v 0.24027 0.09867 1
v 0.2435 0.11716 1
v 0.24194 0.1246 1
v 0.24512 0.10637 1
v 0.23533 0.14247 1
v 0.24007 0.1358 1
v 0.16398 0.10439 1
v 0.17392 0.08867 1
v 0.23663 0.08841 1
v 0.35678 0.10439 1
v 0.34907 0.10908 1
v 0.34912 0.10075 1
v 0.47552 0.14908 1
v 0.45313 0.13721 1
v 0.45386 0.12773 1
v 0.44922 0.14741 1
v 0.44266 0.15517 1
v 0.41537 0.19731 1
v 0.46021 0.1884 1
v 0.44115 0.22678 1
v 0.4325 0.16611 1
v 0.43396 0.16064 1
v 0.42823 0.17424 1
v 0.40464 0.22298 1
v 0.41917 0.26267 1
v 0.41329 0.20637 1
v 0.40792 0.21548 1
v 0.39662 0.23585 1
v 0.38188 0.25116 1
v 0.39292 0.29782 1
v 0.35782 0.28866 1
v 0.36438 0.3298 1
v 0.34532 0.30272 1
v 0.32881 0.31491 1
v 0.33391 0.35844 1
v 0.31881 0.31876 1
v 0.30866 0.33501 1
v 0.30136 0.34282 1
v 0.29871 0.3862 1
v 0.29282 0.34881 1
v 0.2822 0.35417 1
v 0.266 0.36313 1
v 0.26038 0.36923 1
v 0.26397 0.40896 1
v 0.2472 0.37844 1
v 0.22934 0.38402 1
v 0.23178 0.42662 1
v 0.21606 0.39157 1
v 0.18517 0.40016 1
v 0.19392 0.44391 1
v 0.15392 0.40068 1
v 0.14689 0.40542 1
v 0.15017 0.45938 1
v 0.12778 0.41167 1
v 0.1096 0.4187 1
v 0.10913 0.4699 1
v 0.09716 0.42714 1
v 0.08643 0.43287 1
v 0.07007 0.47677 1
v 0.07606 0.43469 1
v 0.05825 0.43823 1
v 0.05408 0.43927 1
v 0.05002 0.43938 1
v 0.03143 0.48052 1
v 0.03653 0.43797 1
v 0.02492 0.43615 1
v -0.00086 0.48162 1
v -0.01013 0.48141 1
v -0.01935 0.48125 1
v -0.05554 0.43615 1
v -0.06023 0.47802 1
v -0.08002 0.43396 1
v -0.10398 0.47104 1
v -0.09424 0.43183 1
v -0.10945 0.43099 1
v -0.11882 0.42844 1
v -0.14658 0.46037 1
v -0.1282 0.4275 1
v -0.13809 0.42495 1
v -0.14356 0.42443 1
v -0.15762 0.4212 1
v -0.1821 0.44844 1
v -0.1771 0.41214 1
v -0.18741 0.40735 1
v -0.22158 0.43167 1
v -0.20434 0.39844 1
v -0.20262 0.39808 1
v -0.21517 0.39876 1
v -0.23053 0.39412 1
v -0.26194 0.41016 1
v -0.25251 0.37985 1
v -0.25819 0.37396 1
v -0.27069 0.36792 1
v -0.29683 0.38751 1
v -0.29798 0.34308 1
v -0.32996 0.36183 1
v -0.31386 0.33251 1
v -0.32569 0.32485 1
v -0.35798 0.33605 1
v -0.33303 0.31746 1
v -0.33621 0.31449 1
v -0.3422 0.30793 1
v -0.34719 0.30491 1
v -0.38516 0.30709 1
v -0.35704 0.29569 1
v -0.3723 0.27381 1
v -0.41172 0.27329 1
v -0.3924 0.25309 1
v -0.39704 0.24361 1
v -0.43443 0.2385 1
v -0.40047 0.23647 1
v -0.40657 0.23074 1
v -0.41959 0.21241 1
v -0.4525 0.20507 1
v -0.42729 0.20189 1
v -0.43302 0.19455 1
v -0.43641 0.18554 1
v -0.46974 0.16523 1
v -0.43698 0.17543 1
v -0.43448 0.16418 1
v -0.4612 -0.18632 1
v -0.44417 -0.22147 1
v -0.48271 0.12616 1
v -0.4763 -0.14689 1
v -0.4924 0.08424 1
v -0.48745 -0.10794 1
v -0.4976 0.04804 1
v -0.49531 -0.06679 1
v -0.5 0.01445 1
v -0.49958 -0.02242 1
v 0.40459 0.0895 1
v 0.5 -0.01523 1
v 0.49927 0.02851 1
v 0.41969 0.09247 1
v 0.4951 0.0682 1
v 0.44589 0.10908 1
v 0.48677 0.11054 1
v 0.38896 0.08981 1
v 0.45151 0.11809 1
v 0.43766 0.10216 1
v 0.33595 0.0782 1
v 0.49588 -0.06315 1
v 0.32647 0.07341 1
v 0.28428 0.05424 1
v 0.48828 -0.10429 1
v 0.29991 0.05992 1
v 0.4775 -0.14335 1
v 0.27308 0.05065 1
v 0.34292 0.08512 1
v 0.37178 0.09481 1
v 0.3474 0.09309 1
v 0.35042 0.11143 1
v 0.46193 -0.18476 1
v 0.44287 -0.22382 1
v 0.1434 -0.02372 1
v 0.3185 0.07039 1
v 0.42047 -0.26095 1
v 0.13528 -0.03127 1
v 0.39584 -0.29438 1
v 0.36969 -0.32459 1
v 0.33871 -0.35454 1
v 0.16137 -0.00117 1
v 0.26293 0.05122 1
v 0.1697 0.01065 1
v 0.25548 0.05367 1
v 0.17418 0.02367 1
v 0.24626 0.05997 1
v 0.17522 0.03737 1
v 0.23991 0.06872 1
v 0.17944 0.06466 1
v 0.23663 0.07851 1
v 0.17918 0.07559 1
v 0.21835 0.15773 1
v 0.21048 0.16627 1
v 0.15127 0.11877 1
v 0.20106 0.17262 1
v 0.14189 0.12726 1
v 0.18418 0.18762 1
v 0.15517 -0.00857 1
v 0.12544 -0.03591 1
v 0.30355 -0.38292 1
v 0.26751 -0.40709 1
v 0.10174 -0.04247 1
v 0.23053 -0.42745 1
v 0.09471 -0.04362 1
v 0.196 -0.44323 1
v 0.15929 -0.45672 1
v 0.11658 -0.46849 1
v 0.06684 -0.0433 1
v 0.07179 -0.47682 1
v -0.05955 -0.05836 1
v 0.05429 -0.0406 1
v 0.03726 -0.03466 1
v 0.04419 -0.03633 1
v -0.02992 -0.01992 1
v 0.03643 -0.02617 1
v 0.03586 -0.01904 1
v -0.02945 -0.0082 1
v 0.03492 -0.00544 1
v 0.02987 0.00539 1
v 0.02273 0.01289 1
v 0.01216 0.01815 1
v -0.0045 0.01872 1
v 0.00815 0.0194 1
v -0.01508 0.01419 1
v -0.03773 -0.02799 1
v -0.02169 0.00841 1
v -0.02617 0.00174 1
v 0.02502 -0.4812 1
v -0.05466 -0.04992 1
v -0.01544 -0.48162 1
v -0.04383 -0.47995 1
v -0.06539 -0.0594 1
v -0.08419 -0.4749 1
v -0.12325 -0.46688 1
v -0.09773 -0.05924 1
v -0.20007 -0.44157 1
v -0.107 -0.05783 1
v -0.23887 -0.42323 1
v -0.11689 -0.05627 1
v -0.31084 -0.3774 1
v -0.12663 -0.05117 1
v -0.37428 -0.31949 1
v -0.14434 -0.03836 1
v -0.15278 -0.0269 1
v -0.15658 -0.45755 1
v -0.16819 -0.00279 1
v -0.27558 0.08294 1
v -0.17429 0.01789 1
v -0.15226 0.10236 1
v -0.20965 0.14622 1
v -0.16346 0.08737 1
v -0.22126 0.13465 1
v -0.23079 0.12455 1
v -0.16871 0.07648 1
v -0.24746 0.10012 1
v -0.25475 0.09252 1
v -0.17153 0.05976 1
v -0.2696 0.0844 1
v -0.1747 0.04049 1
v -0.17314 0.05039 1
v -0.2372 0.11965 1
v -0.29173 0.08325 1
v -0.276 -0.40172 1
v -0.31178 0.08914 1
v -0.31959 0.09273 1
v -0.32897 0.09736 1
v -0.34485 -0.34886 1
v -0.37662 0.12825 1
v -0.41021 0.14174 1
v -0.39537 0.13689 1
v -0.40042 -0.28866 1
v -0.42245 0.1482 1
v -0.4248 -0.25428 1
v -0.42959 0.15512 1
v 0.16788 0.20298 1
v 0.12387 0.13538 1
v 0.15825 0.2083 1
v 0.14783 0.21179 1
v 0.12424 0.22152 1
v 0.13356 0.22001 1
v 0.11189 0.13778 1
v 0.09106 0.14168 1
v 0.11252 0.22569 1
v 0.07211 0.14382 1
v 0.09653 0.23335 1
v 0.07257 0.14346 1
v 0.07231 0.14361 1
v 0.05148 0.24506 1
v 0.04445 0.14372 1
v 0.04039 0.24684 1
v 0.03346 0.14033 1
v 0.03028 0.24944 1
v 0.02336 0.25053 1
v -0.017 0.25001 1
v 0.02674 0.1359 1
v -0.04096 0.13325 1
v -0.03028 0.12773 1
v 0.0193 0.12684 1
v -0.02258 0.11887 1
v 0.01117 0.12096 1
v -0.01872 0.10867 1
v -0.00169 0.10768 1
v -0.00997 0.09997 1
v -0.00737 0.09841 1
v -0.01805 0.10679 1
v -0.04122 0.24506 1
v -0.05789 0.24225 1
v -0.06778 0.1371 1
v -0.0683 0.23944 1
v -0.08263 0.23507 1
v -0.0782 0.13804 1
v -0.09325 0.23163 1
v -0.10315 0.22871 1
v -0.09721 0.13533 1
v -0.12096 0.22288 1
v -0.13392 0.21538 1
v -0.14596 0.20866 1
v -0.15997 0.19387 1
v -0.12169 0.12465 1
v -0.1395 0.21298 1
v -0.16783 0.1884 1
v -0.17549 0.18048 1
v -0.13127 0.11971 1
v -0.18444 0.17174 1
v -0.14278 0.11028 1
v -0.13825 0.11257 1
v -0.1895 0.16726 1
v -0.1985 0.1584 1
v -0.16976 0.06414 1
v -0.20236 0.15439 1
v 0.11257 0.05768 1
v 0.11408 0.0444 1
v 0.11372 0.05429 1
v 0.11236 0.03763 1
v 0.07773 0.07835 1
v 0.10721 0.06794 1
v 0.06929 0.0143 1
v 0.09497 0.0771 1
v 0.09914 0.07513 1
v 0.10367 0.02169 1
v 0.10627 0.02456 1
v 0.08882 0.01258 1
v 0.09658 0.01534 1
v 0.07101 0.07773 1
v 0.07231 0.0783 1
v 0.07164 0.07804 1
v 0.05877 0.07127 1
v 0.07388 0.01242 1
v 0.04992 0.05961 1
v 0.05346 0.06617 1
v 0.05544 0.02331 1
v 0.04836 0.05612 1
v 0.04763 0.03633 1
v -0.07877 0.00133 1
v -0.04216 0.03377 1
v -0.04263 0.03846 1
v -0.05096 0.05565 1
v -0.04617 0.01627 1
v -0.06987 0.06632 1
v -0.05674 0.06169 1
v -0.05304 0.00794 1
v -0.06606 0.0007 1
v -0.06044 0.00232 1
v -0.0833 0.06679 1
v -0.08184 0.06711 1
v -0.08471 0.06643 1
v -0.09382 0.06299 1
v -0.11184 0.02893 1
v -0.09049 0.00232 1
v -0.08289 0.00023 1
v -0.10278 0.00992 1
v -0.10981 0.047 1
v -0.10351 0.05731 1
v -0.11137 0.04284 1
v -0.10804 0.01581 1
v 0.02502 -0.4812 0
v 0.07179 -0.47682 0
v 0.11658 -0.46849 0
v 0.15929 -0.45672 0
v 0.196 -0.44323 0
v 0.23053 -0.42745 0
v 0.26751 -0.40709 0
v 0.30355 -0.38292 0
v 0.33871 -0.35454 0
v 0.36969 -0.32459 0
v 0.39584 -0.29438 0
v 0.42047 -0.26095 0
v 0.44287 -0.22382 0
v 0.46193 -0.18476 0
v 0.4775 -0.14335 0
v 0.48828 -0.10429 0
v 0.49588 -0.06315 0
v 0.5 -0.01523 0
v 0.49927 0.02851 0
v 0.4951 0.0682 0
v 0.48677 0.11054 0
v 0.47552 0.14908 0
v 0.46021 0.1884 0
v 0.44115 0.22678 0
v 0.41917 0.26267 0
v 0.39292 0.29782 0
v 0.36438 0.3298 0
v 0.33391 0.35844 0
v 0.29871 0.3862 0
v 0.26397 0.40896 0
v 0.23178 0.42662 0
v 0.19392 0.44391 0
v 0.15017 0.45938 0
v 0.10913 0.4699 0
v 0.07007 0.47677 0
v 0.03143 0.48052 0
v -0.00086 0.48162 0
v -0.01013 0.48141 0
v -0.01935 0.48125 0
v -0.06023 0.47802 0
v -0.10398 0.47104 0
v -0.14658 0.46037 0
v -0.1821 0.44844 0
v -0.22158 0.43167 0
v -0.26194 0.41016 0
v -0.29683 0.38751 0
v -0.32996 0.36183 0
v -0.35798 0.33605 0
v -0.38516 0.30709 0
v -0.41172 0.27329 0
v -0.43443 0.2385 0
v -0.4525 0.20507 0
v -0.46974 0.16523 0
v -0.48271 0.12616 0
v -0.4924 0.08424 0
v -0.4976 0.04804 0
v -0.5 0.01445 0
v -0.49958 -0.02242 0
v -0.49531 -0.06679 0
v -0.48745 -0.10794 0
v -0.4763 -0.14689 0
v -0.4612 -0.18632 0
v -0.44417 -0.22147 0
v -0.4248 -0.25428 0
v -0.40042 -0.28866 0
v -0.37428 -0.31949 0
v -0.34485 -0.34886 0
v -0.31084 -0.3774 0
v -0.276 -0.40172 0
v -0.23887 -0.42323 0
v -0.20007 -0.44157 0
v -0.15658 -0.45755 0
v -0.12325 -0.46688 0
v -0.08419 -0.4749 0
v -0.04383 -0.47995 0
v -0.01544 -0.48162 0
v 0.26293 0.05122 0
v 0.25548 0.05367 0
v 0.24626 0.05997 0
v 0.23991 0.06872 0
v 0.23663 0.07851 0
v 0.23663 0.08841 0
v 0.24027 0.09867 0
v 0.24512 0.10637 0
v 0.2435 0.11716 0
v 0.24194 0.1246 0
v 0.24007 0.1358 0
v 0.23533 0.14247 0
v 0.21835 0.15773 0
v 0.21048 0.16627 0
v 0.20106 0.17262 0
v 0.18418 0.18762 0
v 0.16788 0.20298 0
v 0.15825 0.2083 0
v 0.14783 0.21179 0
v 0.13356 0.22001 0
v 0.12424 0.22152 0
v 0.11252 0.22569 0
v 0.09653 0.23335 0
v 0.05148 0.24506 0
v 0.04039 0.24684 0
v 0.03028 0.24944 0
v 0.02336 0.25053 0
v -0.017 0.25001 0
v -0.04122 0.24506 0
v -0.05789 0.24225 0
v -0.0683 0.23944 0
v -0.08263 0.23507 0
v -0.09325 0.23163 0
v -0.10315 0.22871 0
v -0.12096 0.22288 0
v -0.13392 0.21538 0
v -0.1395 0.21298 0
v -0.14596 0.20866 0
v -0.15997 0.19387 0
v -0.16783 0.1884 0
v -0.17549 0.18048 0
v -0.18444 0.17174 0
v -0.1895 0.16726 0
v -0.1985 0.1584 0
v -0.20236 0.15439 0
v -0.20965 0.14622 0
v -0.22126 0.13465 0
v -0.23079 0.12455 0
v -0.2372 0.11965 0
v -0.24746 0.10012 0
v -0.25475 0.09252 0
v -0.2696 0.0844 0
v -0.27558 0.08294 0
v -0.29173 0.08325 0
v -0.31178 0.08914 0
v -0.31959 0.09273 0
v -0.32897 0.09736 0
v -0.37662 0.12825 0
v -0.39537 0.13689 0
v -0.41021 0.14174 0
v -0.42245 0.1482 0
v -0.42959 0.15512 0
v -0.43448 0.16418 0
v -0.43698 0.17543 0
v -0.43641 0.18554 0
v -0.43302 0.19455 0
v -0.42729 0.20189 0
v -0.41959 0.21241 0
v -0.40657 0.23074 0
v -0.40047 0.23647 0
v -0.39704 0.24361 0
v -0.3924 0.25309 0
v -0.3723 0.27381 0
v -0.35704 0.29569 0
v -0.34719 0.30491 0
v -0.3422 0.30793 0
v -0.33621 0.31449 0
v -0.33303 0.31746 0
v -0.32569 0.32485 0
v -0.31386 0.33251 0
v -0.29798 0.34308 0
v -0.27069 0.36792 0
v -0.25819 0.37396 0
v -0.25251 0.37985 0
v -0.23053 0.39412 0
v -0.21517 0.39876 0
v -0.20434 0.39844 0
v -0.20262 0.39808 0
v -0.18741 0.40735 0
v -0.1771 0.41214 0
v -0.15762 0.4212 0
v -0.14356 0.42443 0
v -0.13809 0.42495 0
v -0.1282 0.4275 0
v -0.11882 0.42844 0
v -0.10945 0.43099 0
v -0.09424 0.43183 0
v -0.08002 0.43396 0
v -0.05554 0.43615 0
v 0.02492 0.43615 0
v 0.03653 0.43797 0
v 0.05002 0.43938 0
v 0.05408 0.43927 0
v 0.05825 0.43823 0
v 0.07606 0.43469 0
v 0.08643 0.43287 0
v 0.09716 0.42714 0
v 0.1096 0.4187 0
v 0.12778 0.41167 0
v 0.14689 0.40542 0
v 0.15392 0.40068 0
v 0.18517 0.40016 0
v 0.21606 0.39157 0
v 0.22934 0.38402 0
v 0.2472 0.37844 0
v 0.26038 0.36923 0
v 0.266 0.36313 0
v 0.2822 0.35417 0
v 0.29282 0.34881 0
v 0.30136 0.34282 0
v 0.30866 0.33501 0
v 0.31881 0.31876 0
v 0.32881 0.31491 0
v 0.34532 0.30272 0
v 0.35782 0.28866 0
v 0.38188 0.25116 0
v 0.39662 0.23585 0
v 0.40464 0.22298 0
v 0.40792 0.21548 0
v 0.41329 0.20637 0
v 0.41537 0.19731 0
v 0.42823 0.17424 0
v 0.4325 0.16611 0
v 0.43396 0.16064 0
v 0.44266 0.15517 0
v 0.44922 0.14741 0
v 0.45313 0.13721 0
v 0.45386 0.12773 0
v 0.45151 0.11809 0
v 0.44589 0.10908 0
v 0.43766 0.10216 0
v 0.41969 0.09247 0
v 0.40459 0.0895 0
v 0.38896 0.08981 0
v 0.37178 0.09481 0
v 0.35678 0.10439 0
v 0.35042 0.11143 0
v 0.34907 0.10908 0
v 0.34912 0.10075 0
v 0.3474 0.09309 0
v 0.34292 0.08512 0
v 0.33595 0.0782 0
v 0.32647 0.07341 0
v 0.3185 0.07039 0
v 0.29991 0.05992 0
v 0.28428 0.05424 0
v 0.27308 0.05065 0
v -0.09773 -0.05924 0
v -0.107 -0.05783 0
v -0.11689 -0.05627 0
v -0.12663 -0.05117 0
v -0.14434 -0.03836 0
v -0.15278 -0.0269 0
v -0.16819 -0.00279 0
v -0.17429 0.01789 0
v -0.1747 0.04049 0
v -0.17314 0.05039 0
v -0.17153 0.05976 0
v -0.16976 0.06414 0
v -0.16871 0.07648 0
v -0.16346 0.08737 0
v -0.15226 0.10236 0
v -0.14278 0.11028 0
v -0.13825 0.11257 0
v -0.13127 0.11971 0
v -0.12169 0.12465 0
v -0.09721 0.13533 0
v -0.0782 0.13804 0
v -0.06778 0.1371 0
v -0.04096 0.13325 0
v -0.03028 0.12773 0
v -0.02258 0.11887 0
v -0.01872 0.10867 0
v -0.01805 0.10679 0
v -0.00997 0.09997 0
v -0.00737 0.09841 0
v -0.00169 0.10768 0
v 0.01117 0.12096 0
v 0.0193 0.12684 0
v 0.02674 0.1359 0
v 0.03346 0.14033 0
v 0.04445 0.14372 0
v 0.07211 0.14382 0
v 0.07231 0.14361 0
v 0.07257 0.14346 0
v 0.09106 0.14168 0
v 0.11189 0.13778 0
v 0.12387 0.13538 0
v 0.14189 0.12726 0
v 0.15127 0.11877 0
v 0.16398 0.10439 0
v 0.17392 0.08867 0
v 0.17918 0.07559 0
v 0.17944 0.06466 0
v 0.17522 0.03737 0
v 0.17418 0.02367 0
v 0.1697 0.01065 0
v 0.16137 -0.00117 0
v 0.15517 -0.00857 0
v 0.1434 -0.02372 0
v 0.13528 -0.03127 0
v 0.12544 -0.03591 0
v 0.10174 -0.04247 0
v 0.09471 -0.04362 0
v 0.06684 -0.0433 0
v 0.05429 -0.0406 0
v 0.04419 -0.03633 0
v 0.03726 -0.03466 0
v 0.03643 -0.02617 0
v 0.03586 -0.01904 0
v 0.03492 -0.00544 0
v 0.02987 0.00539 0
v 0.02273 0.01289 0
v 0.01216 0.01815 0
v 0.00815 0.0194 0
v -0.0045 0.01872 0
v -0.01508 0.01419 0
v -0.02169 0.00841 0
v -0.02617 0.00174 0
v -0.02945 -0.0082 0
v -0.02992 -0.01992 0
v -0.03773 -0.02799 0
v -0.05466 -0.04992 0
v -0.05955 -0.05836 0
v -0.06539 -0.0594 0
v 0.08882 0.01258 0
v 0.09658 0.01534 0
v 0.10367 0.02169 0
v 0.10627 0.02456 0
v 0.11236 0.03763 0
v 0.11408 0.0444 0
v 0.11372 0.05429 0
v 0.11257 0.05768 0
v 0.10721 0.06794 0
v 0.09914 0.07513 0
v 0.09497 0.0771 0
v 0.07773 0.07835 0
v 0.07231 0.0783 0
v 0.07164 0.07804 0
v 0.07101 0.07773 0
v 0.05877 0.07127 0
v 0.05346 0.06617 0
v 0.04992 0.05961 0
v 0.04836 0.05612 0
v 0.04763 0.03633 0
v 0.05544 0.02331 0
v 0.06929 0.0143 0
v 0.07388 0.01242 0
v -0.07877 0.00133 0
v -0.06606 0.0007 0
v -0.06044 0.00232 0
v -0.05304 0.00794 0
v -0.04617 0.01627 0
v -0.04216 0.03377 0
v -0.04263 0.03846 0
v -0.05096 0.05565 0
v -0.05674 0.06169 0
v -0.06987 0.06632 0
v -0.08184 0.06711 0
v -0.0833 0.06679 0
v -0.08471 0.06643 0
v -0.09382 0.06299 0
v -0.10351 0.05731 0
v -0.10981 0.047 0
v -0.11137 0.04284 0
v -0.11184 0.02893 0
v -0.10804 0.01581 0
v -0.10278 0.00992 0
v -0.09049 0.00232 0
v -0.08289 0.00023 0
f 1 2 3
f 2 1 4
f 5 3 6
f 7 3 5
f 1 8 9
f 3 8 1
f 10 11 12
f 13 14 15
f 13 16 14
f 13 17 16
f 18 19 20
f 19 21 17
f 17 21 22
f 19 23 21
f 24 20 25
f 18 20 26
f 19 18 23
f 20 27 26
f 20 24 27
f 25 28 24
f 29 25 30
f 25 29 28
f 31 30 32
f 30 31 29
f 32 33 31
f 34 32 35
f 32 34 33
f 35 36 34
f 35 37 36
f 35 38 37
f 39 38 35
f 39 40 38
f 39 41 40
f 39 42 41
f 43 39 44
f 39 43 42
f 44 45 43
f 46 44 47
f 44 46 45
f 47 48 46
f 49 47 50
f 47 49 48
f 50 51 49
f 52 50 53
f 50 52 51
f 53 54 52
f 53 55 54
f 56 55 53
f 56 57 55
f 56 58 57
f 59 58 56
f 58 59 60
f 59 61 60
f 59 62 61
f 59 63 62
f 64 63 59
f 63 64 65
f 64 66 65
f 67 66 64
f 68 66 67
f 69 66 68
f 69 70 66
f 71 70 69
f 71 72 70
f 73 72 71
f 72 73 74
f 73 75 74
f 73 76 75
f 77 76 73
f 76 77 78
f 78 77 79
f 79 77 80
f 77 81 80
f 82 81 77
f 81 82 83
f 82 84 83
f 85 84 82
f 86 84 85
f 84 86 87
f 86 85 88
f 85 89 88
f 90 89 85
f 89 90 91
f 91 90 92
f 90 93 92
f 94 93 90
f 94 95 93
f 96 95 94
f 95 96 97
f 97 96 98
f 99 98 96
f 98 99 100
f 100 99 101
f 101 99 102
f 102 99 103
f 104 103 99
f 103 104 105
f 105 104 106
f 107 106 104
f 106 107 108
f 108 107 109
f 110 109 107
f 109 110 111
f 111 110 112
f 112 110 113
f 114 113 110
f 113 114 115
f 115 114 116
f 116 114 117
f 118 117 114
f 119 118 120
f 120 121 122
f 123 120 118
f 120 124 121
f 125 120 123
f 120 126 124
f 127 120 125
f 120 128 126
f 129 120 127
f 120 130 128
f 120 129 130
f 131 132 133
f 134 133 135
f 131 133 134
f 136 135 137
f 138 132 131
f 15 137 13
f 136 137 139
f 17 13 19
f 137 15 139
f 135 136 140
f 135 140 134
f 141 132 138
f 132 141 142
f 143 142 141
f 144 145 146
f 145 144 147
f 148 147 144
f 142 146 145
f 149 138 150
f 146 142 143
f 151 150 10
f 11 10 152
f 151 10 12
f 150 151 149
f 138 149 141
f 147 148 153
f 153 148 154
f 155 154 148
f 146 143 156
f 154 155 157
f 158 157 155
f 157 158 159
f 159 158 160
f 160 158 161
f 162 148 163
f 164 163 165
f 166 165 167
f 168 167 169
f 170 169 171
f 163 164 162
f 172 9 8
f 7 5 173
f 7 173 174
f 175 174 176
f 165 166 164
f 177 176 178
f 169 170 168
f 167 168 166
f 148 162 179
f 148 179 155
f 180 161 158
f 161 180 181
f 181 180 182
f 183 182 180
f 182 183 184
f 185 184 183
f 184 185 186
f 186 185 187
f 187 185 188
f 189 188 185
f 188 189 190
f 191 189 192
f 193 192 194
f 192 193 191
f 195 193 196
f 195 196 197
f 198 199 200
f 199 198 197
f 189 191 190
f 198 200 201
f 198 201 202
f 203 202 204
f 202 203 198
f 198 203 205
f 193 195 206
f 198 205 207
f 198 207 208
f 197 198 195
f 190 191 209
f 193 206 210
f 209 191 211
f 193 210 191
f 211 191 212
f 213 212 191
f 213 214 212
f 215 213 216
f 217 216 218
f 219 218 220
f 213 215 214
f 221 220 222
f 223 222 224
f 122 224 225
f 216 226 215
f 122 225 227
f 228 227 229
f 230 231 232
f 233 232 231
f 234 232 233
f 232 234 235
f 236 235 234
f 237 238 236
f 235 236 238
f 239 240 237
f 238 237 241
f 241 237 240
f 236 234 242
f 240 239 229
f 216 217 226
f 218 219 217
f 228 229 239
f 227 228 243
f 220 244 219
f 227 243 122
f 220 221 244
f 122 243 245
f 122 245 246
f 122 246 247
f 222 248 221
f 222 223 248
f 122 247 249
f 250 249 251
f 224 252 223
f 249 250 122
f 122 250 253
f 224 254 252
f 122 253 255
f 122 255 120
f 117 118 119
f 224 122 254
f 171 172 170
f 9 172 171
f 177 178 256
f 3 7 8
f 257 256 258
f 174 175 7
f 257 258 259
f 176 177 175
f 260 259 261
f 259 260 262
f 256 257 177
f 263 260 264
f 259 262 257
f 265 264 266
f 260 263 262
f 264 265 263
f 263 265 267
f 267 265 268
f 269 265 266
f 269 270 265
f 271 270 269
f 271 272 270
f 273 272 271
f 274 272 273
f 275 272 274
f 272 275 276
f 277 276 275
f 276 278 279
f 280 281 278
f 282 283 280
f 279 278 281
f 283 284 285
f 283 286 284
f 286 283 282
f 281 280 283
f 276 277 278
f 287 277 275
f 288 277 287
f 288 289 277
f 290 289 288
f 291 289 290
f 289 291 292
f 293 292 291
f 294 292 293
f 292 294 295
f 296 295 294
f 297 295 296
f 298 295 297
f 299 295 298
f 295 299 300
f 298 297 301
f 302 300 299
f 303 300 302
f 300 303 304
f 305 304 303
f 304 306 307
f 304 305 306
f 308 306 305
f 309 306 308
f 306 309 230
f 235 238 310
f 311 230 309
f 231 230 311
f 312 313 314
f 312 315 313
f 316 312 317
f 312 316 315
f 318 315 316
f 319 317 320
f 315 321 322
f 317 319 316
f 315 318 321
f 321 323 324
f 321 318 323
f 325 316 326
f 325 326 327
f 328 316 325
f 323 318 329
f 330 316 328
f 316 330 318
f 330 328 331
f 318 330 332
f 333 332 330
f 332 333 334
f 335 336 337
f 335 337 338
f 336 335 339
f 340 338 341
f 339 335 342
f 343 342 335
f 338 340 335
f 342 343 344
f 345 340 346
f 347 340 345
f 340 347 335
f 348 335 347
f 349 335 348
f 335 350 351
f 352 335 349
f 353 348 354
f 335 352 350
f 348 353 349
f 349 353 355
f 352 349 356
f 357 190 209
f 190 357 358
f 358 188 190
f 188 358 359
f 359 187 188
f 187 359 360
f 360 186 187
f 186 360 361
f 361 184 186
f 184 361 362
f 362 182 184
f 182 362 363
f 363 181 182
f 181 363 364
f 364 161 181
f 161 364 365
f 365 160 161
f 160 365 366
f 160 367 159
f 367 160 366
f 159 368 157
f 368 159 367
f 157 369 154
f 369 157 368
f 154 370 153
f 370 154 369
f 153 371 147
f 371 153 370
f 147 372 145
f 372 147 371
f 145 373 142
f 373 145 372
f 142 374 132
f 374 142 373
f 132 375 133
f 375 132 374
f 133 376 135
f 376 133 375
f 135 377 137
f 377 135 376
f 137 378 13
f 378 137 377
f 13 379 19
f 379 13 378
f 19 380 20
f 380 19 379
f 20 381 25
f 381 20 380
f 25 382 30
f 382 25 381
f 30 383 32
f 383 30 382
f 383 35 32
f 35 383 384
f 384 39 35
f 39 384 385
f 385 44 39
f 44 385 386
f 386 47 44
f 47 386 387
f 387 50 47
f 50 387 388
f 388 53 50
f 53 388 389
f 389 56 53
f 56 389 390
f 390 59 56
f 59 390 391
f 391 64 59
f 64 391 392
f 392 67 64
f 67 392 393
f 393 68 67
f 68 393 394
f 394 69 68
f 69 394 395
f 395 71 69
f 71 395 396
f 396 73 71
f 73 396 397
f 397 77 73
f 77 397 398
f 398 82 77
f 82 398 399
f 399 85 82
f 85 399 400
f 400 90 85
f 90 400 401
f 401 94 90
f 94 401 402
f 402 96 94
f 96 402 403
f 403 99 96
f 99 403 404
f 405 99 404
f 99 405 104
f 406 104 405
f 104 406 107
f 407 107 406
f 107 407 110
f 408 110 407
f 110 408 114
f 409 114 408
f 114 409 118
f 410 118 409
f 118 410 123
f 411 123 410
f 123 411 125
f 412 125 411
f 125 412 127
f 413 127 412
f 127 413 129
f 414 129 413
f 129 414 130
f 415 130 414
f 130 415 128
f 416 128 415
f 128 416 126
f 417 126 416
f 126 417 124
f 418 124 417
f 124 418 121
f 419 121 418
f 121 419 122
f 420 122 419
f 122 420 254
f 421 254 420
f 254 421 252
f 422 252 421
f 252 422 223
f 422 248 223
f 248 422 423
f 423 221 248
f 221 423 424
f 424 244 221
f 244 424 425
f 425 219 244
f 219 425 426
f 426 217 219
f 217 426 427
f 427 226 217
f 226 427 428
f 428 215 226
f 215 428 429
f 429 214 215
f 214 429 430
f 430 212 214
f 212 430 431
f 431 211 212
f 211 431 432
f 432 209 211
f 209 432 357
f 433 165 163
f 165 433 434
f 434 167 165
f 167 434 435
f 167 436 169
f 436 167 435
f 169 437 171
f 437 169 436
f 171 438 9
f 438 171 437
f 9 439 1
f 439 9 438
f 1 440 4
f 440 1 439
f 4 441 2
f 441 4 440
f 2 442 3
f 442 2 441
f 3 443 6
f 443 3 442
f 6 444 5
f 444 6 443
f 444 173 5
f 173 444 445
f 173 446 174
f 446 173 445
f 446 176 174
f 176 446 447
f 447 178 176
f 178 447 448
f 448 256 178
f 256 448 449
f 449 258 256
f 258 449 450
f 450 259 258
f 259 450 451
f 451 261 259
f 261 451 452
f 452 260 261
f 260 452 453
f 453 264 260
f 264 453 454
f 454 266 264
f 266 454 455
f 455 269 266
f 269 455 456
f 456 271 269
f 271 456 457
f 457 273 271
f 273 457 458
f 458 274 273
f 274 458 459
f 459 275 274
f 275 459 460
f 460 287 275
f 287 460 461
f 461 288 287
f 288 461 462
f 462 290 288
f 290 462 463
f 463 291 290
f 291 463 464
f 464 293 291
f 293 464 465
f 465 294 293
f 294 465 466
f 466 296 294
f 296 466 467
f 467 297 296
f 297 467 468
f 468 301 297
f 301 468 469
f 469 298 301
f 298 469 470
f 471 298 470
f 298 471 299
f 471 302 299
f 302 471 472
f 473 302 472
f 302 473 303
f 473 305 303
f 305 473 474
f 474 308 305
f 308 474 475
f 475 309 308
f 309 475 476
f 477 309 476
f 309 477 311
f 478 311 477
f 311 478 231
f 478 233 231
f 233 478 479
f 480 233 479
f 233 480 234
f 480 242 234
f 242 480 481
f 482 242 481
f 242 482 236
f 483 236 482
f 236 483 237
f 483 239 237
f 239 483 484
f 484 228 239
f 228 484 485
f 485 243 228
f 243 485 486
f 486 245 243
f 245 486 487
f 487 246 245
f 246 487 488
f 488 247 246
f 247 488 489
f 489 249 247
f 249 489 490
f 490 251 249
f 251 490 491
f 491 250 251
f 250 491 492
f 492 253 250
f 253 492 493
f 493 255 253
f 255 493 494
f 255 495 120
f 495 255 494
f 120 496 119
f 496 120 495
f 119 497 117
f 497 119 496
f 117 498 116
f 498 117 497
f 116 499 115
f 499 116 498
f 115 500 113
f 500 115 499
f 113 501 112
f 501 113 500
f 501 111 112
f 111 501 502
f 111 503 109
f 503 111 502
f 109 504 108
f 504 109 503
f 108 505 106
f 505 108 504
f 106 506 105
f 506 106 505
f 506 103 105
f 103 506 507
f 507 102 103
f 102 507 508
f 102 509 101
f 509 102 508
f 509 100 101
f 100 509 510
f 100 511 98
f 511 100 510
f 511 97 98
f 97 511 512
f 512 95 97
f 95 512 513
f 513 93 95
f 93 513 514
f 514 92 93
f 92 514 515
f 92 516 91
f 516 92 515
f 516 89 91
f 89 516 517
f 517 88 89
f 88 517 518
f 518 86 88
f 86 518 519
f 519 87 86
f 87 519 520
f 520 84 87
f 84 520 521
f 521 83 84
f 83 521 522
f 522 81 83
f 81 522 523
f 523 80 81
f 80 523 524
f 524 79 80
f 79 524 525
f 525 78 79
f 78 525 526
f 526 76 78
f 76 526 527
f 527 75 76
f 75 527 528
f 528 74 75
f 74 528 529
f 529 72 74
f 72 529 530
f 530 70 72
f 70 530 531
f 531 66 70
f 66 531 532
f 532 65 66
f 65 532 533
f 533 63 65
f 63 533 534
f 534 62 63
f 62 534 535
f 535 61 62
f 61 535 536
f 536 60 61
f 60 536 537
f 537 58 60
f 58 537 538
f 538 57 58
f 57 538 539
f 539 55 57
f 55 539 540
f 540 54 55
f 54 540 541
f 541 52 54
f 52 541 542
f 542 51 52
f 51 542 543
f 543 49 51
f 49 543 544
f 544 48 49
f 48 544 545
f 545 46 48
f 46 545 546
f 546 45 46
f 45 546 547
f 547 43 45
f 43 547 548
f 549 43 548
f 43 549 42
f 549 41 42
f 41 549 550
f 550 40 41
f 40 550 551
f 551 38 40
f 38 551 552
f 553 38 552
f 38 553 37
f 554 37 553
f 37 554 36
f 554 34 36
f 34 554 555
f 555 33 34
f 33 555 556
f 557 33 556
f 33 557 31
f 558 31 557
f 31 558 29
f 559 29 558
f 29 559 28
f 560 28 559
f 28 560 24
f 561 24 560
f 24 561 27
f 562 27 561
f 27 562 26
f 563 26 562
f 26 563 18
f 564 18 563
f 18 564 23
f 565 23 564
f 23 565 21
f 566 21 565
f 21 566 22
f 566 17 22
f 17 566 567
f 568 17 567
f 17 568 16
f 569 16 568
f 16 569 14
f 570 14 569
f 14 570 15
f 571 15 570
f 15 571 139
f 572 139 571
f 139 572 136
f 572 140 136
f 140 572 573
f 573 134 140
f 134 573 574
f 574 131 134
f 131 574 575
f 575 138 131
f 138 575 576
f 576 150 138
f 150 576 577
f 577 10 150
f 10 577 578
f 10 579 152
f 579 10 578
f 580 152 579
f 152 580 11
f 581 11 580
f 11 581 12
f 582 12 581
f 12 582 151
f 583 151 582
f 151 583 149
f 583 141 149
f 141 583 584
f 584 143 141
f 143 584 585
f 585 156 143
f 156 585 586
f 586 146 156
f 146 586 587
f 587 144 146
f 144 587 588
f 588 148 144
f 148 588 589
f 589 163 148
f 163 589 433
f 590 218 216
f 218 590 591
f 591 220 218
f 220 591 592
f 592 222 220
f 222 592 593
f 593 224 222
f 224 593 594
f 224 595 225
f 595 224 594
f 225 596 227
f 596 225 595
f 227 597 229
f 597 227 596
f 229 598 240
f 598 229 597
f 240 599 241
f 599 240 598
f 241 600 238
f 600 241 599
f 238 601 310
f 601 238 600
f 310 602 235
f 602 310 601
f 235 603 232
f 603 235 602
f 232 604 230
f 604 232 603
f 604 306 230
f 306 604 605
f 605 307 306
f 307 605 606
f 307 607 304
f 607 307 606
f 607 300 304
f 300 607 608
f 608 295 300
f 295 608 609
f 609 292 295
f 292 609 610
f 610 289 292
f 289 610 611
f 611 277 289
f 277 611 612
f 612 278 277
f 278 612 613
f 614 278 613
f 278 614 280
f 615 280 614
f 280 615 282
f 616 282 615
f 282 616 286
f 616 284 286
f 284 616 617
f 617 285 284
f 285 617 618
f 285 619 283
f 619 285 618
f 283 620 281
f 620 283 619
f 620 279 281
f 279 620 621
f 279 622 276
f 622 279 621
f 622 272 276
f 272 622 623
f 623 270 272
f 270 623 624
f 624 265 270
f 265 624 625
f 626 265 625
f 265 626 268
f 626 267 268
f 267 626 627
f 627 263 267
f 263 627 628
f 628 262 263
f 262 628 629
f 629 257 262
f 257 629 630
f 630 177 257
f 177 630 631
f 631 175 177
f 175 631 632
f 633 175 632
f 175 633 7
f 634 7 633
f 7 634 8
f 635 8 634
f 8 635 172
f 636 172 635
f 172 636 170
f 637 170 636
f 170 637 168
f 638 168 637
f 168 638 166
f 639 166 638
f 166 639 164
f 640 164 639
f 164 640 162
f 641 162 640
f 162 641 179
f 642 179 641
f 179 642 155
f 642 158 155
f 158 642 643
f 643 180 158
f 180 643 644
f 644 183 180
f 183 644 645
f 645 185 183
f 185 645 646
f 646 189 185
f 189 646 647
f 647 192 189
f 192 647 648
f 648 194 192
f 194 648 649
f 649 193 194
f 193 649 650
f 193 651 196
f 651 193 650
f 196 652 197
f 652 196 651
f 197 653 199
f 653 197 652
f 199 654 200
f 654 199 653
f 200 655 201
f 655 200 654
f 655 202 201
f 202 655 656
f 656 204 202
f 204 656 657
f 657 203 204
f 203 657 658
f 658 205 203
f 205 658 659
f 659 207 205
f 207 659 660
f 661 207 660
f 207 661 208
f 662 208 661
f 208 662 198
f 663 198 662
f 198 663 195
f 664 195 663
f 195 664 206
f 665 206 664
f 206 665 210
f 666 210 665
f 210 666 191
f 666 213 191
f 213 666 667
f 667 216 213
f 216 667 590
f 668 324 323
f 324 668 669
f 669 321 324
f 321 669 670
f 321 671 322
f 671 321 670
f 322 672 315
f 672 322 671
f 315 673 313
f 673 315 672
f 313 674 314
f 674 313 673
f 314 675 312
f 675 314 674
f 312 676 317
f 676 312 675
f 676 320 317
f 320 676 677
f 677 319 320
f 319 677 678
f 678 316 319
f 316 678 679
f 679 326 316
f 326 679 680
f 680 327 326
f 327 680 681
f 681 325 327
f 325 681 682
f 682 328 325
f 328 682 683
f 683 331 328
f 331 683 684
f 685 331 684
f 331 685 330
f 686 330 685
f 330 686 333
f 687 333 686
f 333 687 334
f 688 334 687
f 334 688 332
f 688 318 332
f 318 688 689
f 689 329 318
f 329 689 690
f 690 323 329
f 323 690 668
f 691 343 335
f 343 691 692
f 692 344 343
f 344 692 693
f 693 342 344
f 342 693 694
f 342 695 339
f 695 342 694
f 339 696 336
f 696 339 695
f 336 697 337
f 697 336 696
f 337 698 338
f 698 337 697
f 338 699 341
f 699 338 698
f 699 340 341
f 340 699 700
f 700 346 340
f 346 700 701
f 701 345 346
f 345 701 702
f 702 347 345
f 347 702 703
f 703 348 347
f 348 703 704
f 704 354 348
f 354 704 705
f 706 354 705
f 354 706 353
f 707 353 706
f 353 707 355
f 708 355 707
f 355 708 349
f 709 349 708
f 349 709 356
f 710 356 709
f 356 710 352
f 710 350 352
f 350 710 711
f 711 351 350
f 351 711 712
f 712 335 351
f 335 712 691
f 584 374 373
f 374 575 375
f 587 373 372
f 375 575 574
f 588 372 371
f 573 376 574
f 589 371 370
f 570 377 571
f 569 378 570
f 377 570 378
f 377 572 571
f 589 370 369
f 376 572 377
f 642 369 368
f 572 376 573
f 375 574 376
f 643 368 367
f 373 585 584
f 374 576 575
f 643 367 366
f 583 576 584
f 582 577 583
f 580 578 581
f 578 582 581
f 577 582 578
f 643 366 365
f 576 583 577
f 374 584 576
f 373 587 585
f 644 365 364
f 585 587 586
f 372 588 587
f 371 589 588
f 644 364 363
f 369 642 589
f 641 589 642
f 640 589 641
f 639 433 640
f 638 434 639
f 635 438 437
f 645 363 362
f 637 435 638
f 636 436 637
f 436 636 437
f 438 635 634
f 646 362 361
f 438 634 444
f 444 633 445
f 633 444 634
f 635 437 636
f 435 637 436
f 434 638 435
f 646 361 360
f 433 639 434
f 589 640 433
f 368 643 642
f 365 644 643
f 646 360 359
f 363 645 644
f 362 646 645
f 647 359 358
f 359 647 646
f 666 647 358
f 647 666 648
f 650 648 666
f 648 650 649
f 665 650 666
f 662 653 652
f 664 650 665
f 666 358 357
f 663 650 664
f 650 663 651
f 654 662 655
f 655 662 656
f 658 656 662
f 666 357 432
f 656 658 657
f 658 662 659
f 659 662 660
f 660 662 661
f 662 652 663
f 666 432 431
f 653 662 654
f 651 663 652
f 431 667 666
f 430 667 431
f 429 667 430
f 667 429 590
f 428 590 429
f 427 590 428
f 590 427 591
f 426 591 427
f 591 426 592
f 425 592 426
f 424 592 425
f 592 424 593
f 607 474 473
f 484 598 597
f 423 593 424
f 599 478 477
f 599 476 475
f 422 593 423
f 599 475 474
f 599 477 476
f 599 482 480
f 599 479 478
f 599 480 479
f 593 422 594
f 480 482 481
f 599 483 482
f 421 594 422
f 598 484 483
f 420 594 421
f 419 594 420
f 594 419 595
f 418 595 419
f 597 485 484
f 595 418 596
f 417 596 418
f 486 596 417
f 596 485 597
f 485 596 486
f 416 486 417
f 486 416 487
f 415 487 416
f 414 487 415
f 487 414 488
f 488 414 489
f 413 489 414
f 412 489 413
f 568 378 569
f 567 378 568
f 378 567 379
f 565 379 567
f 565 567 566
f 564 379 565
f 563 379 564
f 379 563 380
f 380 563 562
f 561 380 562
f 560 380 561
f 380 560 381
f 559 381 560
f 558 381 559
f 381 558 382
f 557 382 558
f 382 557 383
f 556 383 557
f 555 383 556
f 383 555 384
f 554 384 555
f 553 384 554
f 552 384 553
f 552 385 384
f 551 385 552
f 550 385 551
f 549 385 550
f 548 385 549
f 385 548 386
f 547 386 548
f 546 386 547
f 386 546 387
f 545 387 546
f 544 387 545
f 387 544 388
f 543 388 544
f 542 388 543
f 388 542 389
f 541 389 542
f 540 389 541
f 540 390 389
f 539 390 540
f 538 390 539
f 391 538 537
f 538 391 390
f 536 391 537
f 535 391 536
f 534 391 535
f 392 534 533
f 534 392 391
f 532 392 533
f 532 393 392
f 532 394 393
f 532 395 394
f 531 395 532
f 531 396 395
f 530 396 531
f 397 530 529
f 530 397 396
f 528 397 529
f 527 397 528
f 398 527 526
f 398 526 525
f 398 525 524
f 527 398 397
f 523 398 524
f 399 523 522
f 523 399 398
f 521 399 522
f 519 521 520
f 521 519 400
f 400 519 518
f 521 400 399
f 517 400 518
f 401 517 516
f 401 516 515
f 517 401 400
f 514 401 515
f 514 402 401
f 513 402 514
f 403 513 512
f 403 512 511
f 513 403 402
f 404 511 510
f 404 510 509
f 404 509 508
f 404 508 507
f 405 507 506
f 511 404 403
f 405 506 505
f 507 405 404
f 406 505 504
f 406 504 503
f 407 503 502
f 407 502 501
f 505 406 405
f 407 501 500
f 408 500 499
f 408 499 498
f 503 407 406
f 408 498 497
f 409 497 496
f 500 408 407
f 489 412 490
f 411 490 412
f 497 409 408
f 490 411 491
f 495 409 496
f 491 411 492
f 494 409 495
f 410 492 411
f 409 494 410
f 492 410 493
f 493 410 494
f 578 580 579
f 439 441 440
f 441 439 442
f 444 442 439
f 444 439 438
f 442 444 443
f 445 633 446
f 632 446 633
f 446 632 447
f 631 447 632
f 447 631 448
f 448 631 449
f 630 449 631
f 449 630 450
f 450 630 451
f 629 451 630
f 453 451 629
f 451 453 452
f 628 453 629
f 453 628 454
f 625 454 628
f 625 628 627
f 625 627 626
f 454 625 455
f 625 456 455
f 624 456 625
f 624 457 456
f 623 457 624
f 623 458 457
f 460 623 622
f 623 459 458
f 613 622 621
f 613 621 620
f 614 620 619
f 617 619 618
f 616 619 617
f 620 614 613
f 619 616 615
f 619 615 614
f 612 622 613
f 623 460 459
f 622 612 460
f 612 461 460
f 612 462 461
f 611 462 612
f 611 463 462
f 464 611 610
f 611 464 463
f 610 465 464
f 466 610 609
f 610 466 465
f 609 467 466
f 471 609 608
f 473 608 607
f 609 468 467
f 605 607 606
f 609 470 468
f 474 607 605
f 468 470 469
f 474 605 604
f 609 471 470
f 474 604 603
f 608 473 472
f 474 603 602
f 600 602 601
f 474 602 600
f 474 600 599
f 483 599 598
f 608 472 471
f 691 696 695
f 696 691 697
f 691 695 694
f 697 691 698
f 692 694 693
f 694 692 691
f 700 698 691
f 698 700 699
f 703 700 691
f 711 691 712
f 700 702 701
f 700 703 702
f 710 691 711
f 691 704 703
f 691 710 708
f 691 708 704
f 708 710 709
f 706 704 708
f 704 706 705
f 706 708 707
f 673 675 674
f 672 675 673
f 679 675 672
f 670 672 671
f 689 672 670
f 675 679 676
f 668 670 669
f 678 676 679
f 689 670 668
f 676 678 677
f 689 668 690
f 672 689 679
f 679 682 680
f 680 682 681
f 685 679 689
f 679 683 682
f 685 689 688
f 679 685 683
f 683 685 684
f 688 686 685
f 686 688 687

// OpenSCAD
module Hedwig3black_1()
{
 /* Generated by trace2scad version 20150415
    http://aggregate.org/MAKE/TRACE2SCAD/
    Optimized model has 357/2605 original points
 */
 color([0.5, 0.5, 0.5])
 assign(minx=314) /* polygon minx=314 */
 assign(miny=368) /* polygon miny=368 */
 assign(maxx=19515) /* polygon maxx=19515 */
 assign(maxy=18863) /* polygon maxy=18863 */
 assign(dx=maxx-minx)
 assign(dy=maxy-miny)
 assign(maxd=((dx>dy)?dx:dy))
 scale([1/maxd, 1/maxd, 1])
 translate([-minx-dx/2, -miny-dy/2, 0])
 linear_extrude(height=1, convexity=357)
 union() {
  union() {
   union() {
    difference() {
     polygon([[9720,18859],[9543,18856],[8758,18794],[7918,18660],[7100,18455],[6418,18226],[5660,17904],[4885,17491],[4215,17056],[3579,16563],[3041,16068],[2519,15512],[2009,14863],[1573,14195],[1226,13553],[895,12788],[646,12038],[460,11233],[360,10538],[314,9893],[322,9185],[404,8333],[555,7543],[769,6795],[1059,6038],[1386,5363],[1758,4733],[2226,4073],[2728,3481],[3293,2917],[3946,2369],[4615,1902],[5328,1489],[6073,1137],[6908,830],[7548,651],[8298,497],[9073,400],[9618,368],[10395,376],[11293,460],[12153,620],[12973,846],[13678,1105],[14341,1408],[15051,1799],[15743,2263],[16418,2808],[17013,3383],[17515,3963],[17988,4605],[18418,5318],[18784,6068],[19083,6863],[19290,7613],[19436,8403],[19515,9323],[19501,10163],[19421,10925],[19261,11738],[19045,12478],[18751,13233],[18385,13970],[17963,14659],[17459,15334],[16911,15948],[16326,16498],[15650,17031],[14983,17468],[14365,17807],[13638,18139],[12798,18436],[12010,18638],[11260,18770],[10518,18842],[9898,18863]], convexity=6);
     polygon([[10993,18040],[11033,18030],[11375,17962],[11574,17927],[11780,17817],[12019,17655],[12368,17520],[12735,17400],[12870,17309],[13470,17299],[14063,17134],[14318,16989],[14661,16882],[14914,16705],[15022,16588],[15333,16416],[15537,16313],[15701,16198],[15841,16048],[16036,15736],[16228,15662],[16545,15428],[16785,15158],[17247,14438],[17530,14144],[17684,13897],[17747,13753],[17850,13578],[17890,13404],[18137,12961],[18219,12805],[18247,12700],[18414,12595],[18540,12446],[18615,12250],[18629,12068],[18584,11883],[18476,11710],[18318,11577],[17973,11391],[17683,11334],[17383,11340],[17053,11436],[16765,11620],[16643,11755],[16617,11710],[16618,11550],[16585,11403],[16499,11250],[16365,11117],[16183,11025],[16030,10967],[15673,10766],[15373,10657],[15158,10588],[14963,10599],[14820,10646],[14643,10767],[14521,10935],[14458,11123],[14458,11313],[14528,11510],[14621,11658],[14590,11865],[14560,12008],[14524,12223],[14433,12351],[14107,12644],[13956,12808],[13775,12930],[13451,13218],[13138,13513],[12953,13615],[12753,13682],[12479,13840],[12300,13869],[12075,13949],[11768,14096],[10903,14321],[10690,14355],[10496,14405],[10363,14426],[9588,14416],[9123,14321],[8803,14267],[8603,14213],[8328,14129],[8124,14063],[7934,14007],[7592,13895],[7343,13751],[7236,13705],[7112,13622],[6843,13338],[6692,13233],[6545,13081],[6373,12913],[6276,12827],[6103,12657],[6029,12580],[5889,12423],[5666,12201],[5483,12007],[5360,11913],[5163,11538],[5023,11392],[4738,11236],[4623,11208],[4313,11214],[3928,11327],[3778,11396],[3598,11485],[2683,12078],[2323,12244],[2038,12337],[1803,12461],[1666,12594],[1572,12768],[1524,12984],[1535,13178],[1600,13351],[1710,13492],[1858,13694],[2108,14046],[2225,14156],[2291,14293],[2380,14475],[2766,14873],[3059,15293],[3248,15470],[3344,15528],[3459,15654],[3520,15711],[3661,15853],[3888,16000],[4193,16203],[4717,16680],[4957,16796],[5066,16909],[5488,17183],[5783,17272],[5991,17266],[6024,17259],[6316,17437],[6514,17529],[6888,17703],[7158,17765],[7263,17775],[7453,17824],[7633,17842],[7813,17891],[8105,17907],[8378,17948],[8848,17990],[10393,17990],[10616,18025],[10875,18052],[10953,18050]], convexity=17);
     polygon([[11303,12373],[11308,12370],[11663,12336],[12063,12261],[12293,12215],[12639,12059],[12819,11896],[13063,11620],[13254,11318],[13355,11067],[13360,10857],[13279,10333],[13259,10070],[13173,9820],[13013,9593],[12894,9451],[12668,9160],[12512,9015],[12323,8926],[11868,8800],[11733,8778],[11198,8784],[10957,8836],[10763,8918],[10630,8950],[10614,9113],[10603,9250],[10585,9511],[10488,9719],[10351,9863],[10148,9964],[10071,9988],[9828,9975],[9625,9888],[9498,9777],[9412,9649],[9349,9458],[9340,9233],[9190,9078],[8865,8657],[8771,8495],[8659,8475],[8038,8478],[7860,8505],[7670,8535],[7483,8633],[7143,8879],[6981,9099],[6685,9562],[6568,9959],[6560,10393],[6590,10583],[6621,10763],[6655,10847],[6675,11084],[6776,11293],[6991,11581],[7173,11733],[7260,11777],[7394,11914],[7578,12009],[8048,12214],[8413,12266],[8613,12248],[9128,12174],[9333,12068],[9481,11898],[9555,11702],[9568,11666],[9723,11535],[9773,11505],[9882,11683],[10129,11938],[10285,12051],[10428,12225],[10557,12310],[10768,12375],[11299,12377]], convexity=10);
    }
    polygon([[11290,11114],[11278,11108],[11043,10984],[10941,10886],[10873,10760],[10843,10693],[10829,10313],[10979,10063],[11245,9890],[11333,9854],[11620,9857],[11769,9910],[11905,10032],[11955,10087],[12072,10338],[12105,10468],[12098,10658],[12076,10723],[11973,10920],[11818,11058],[11738,11096],[11407,11120],[11303,11119]], convexity=7);
    polygon([[8315,10898],[8288,10891],[8113,10825],[7927,10716],[7806,10518],[7776,10438],[7767,10171],[7840,9919],[7941,9806],[8177,9660],[8323,9620],[8402,9641],[8646,9629],[8754,9660],[8896,9768],[9028,9928],[9105,10264],[9096,10354],[8936,10684],[8825,10800],[8573,10889],[8343,10904]], convexity=8);
   }
  }
 }
}

module Hedwig3black()
{
 /* all layers combined, scaled to within a 1mm cube */
 scale([1, 1, 1/1])
 difference() {
  union() {
   scale([1,1,2]) translate([0,0,-0.5]) Hedwig3black_1();
  }
  translate([0,0,-2]) cube([2,2,4],center=true);
 }
}
Hedwig3black();
